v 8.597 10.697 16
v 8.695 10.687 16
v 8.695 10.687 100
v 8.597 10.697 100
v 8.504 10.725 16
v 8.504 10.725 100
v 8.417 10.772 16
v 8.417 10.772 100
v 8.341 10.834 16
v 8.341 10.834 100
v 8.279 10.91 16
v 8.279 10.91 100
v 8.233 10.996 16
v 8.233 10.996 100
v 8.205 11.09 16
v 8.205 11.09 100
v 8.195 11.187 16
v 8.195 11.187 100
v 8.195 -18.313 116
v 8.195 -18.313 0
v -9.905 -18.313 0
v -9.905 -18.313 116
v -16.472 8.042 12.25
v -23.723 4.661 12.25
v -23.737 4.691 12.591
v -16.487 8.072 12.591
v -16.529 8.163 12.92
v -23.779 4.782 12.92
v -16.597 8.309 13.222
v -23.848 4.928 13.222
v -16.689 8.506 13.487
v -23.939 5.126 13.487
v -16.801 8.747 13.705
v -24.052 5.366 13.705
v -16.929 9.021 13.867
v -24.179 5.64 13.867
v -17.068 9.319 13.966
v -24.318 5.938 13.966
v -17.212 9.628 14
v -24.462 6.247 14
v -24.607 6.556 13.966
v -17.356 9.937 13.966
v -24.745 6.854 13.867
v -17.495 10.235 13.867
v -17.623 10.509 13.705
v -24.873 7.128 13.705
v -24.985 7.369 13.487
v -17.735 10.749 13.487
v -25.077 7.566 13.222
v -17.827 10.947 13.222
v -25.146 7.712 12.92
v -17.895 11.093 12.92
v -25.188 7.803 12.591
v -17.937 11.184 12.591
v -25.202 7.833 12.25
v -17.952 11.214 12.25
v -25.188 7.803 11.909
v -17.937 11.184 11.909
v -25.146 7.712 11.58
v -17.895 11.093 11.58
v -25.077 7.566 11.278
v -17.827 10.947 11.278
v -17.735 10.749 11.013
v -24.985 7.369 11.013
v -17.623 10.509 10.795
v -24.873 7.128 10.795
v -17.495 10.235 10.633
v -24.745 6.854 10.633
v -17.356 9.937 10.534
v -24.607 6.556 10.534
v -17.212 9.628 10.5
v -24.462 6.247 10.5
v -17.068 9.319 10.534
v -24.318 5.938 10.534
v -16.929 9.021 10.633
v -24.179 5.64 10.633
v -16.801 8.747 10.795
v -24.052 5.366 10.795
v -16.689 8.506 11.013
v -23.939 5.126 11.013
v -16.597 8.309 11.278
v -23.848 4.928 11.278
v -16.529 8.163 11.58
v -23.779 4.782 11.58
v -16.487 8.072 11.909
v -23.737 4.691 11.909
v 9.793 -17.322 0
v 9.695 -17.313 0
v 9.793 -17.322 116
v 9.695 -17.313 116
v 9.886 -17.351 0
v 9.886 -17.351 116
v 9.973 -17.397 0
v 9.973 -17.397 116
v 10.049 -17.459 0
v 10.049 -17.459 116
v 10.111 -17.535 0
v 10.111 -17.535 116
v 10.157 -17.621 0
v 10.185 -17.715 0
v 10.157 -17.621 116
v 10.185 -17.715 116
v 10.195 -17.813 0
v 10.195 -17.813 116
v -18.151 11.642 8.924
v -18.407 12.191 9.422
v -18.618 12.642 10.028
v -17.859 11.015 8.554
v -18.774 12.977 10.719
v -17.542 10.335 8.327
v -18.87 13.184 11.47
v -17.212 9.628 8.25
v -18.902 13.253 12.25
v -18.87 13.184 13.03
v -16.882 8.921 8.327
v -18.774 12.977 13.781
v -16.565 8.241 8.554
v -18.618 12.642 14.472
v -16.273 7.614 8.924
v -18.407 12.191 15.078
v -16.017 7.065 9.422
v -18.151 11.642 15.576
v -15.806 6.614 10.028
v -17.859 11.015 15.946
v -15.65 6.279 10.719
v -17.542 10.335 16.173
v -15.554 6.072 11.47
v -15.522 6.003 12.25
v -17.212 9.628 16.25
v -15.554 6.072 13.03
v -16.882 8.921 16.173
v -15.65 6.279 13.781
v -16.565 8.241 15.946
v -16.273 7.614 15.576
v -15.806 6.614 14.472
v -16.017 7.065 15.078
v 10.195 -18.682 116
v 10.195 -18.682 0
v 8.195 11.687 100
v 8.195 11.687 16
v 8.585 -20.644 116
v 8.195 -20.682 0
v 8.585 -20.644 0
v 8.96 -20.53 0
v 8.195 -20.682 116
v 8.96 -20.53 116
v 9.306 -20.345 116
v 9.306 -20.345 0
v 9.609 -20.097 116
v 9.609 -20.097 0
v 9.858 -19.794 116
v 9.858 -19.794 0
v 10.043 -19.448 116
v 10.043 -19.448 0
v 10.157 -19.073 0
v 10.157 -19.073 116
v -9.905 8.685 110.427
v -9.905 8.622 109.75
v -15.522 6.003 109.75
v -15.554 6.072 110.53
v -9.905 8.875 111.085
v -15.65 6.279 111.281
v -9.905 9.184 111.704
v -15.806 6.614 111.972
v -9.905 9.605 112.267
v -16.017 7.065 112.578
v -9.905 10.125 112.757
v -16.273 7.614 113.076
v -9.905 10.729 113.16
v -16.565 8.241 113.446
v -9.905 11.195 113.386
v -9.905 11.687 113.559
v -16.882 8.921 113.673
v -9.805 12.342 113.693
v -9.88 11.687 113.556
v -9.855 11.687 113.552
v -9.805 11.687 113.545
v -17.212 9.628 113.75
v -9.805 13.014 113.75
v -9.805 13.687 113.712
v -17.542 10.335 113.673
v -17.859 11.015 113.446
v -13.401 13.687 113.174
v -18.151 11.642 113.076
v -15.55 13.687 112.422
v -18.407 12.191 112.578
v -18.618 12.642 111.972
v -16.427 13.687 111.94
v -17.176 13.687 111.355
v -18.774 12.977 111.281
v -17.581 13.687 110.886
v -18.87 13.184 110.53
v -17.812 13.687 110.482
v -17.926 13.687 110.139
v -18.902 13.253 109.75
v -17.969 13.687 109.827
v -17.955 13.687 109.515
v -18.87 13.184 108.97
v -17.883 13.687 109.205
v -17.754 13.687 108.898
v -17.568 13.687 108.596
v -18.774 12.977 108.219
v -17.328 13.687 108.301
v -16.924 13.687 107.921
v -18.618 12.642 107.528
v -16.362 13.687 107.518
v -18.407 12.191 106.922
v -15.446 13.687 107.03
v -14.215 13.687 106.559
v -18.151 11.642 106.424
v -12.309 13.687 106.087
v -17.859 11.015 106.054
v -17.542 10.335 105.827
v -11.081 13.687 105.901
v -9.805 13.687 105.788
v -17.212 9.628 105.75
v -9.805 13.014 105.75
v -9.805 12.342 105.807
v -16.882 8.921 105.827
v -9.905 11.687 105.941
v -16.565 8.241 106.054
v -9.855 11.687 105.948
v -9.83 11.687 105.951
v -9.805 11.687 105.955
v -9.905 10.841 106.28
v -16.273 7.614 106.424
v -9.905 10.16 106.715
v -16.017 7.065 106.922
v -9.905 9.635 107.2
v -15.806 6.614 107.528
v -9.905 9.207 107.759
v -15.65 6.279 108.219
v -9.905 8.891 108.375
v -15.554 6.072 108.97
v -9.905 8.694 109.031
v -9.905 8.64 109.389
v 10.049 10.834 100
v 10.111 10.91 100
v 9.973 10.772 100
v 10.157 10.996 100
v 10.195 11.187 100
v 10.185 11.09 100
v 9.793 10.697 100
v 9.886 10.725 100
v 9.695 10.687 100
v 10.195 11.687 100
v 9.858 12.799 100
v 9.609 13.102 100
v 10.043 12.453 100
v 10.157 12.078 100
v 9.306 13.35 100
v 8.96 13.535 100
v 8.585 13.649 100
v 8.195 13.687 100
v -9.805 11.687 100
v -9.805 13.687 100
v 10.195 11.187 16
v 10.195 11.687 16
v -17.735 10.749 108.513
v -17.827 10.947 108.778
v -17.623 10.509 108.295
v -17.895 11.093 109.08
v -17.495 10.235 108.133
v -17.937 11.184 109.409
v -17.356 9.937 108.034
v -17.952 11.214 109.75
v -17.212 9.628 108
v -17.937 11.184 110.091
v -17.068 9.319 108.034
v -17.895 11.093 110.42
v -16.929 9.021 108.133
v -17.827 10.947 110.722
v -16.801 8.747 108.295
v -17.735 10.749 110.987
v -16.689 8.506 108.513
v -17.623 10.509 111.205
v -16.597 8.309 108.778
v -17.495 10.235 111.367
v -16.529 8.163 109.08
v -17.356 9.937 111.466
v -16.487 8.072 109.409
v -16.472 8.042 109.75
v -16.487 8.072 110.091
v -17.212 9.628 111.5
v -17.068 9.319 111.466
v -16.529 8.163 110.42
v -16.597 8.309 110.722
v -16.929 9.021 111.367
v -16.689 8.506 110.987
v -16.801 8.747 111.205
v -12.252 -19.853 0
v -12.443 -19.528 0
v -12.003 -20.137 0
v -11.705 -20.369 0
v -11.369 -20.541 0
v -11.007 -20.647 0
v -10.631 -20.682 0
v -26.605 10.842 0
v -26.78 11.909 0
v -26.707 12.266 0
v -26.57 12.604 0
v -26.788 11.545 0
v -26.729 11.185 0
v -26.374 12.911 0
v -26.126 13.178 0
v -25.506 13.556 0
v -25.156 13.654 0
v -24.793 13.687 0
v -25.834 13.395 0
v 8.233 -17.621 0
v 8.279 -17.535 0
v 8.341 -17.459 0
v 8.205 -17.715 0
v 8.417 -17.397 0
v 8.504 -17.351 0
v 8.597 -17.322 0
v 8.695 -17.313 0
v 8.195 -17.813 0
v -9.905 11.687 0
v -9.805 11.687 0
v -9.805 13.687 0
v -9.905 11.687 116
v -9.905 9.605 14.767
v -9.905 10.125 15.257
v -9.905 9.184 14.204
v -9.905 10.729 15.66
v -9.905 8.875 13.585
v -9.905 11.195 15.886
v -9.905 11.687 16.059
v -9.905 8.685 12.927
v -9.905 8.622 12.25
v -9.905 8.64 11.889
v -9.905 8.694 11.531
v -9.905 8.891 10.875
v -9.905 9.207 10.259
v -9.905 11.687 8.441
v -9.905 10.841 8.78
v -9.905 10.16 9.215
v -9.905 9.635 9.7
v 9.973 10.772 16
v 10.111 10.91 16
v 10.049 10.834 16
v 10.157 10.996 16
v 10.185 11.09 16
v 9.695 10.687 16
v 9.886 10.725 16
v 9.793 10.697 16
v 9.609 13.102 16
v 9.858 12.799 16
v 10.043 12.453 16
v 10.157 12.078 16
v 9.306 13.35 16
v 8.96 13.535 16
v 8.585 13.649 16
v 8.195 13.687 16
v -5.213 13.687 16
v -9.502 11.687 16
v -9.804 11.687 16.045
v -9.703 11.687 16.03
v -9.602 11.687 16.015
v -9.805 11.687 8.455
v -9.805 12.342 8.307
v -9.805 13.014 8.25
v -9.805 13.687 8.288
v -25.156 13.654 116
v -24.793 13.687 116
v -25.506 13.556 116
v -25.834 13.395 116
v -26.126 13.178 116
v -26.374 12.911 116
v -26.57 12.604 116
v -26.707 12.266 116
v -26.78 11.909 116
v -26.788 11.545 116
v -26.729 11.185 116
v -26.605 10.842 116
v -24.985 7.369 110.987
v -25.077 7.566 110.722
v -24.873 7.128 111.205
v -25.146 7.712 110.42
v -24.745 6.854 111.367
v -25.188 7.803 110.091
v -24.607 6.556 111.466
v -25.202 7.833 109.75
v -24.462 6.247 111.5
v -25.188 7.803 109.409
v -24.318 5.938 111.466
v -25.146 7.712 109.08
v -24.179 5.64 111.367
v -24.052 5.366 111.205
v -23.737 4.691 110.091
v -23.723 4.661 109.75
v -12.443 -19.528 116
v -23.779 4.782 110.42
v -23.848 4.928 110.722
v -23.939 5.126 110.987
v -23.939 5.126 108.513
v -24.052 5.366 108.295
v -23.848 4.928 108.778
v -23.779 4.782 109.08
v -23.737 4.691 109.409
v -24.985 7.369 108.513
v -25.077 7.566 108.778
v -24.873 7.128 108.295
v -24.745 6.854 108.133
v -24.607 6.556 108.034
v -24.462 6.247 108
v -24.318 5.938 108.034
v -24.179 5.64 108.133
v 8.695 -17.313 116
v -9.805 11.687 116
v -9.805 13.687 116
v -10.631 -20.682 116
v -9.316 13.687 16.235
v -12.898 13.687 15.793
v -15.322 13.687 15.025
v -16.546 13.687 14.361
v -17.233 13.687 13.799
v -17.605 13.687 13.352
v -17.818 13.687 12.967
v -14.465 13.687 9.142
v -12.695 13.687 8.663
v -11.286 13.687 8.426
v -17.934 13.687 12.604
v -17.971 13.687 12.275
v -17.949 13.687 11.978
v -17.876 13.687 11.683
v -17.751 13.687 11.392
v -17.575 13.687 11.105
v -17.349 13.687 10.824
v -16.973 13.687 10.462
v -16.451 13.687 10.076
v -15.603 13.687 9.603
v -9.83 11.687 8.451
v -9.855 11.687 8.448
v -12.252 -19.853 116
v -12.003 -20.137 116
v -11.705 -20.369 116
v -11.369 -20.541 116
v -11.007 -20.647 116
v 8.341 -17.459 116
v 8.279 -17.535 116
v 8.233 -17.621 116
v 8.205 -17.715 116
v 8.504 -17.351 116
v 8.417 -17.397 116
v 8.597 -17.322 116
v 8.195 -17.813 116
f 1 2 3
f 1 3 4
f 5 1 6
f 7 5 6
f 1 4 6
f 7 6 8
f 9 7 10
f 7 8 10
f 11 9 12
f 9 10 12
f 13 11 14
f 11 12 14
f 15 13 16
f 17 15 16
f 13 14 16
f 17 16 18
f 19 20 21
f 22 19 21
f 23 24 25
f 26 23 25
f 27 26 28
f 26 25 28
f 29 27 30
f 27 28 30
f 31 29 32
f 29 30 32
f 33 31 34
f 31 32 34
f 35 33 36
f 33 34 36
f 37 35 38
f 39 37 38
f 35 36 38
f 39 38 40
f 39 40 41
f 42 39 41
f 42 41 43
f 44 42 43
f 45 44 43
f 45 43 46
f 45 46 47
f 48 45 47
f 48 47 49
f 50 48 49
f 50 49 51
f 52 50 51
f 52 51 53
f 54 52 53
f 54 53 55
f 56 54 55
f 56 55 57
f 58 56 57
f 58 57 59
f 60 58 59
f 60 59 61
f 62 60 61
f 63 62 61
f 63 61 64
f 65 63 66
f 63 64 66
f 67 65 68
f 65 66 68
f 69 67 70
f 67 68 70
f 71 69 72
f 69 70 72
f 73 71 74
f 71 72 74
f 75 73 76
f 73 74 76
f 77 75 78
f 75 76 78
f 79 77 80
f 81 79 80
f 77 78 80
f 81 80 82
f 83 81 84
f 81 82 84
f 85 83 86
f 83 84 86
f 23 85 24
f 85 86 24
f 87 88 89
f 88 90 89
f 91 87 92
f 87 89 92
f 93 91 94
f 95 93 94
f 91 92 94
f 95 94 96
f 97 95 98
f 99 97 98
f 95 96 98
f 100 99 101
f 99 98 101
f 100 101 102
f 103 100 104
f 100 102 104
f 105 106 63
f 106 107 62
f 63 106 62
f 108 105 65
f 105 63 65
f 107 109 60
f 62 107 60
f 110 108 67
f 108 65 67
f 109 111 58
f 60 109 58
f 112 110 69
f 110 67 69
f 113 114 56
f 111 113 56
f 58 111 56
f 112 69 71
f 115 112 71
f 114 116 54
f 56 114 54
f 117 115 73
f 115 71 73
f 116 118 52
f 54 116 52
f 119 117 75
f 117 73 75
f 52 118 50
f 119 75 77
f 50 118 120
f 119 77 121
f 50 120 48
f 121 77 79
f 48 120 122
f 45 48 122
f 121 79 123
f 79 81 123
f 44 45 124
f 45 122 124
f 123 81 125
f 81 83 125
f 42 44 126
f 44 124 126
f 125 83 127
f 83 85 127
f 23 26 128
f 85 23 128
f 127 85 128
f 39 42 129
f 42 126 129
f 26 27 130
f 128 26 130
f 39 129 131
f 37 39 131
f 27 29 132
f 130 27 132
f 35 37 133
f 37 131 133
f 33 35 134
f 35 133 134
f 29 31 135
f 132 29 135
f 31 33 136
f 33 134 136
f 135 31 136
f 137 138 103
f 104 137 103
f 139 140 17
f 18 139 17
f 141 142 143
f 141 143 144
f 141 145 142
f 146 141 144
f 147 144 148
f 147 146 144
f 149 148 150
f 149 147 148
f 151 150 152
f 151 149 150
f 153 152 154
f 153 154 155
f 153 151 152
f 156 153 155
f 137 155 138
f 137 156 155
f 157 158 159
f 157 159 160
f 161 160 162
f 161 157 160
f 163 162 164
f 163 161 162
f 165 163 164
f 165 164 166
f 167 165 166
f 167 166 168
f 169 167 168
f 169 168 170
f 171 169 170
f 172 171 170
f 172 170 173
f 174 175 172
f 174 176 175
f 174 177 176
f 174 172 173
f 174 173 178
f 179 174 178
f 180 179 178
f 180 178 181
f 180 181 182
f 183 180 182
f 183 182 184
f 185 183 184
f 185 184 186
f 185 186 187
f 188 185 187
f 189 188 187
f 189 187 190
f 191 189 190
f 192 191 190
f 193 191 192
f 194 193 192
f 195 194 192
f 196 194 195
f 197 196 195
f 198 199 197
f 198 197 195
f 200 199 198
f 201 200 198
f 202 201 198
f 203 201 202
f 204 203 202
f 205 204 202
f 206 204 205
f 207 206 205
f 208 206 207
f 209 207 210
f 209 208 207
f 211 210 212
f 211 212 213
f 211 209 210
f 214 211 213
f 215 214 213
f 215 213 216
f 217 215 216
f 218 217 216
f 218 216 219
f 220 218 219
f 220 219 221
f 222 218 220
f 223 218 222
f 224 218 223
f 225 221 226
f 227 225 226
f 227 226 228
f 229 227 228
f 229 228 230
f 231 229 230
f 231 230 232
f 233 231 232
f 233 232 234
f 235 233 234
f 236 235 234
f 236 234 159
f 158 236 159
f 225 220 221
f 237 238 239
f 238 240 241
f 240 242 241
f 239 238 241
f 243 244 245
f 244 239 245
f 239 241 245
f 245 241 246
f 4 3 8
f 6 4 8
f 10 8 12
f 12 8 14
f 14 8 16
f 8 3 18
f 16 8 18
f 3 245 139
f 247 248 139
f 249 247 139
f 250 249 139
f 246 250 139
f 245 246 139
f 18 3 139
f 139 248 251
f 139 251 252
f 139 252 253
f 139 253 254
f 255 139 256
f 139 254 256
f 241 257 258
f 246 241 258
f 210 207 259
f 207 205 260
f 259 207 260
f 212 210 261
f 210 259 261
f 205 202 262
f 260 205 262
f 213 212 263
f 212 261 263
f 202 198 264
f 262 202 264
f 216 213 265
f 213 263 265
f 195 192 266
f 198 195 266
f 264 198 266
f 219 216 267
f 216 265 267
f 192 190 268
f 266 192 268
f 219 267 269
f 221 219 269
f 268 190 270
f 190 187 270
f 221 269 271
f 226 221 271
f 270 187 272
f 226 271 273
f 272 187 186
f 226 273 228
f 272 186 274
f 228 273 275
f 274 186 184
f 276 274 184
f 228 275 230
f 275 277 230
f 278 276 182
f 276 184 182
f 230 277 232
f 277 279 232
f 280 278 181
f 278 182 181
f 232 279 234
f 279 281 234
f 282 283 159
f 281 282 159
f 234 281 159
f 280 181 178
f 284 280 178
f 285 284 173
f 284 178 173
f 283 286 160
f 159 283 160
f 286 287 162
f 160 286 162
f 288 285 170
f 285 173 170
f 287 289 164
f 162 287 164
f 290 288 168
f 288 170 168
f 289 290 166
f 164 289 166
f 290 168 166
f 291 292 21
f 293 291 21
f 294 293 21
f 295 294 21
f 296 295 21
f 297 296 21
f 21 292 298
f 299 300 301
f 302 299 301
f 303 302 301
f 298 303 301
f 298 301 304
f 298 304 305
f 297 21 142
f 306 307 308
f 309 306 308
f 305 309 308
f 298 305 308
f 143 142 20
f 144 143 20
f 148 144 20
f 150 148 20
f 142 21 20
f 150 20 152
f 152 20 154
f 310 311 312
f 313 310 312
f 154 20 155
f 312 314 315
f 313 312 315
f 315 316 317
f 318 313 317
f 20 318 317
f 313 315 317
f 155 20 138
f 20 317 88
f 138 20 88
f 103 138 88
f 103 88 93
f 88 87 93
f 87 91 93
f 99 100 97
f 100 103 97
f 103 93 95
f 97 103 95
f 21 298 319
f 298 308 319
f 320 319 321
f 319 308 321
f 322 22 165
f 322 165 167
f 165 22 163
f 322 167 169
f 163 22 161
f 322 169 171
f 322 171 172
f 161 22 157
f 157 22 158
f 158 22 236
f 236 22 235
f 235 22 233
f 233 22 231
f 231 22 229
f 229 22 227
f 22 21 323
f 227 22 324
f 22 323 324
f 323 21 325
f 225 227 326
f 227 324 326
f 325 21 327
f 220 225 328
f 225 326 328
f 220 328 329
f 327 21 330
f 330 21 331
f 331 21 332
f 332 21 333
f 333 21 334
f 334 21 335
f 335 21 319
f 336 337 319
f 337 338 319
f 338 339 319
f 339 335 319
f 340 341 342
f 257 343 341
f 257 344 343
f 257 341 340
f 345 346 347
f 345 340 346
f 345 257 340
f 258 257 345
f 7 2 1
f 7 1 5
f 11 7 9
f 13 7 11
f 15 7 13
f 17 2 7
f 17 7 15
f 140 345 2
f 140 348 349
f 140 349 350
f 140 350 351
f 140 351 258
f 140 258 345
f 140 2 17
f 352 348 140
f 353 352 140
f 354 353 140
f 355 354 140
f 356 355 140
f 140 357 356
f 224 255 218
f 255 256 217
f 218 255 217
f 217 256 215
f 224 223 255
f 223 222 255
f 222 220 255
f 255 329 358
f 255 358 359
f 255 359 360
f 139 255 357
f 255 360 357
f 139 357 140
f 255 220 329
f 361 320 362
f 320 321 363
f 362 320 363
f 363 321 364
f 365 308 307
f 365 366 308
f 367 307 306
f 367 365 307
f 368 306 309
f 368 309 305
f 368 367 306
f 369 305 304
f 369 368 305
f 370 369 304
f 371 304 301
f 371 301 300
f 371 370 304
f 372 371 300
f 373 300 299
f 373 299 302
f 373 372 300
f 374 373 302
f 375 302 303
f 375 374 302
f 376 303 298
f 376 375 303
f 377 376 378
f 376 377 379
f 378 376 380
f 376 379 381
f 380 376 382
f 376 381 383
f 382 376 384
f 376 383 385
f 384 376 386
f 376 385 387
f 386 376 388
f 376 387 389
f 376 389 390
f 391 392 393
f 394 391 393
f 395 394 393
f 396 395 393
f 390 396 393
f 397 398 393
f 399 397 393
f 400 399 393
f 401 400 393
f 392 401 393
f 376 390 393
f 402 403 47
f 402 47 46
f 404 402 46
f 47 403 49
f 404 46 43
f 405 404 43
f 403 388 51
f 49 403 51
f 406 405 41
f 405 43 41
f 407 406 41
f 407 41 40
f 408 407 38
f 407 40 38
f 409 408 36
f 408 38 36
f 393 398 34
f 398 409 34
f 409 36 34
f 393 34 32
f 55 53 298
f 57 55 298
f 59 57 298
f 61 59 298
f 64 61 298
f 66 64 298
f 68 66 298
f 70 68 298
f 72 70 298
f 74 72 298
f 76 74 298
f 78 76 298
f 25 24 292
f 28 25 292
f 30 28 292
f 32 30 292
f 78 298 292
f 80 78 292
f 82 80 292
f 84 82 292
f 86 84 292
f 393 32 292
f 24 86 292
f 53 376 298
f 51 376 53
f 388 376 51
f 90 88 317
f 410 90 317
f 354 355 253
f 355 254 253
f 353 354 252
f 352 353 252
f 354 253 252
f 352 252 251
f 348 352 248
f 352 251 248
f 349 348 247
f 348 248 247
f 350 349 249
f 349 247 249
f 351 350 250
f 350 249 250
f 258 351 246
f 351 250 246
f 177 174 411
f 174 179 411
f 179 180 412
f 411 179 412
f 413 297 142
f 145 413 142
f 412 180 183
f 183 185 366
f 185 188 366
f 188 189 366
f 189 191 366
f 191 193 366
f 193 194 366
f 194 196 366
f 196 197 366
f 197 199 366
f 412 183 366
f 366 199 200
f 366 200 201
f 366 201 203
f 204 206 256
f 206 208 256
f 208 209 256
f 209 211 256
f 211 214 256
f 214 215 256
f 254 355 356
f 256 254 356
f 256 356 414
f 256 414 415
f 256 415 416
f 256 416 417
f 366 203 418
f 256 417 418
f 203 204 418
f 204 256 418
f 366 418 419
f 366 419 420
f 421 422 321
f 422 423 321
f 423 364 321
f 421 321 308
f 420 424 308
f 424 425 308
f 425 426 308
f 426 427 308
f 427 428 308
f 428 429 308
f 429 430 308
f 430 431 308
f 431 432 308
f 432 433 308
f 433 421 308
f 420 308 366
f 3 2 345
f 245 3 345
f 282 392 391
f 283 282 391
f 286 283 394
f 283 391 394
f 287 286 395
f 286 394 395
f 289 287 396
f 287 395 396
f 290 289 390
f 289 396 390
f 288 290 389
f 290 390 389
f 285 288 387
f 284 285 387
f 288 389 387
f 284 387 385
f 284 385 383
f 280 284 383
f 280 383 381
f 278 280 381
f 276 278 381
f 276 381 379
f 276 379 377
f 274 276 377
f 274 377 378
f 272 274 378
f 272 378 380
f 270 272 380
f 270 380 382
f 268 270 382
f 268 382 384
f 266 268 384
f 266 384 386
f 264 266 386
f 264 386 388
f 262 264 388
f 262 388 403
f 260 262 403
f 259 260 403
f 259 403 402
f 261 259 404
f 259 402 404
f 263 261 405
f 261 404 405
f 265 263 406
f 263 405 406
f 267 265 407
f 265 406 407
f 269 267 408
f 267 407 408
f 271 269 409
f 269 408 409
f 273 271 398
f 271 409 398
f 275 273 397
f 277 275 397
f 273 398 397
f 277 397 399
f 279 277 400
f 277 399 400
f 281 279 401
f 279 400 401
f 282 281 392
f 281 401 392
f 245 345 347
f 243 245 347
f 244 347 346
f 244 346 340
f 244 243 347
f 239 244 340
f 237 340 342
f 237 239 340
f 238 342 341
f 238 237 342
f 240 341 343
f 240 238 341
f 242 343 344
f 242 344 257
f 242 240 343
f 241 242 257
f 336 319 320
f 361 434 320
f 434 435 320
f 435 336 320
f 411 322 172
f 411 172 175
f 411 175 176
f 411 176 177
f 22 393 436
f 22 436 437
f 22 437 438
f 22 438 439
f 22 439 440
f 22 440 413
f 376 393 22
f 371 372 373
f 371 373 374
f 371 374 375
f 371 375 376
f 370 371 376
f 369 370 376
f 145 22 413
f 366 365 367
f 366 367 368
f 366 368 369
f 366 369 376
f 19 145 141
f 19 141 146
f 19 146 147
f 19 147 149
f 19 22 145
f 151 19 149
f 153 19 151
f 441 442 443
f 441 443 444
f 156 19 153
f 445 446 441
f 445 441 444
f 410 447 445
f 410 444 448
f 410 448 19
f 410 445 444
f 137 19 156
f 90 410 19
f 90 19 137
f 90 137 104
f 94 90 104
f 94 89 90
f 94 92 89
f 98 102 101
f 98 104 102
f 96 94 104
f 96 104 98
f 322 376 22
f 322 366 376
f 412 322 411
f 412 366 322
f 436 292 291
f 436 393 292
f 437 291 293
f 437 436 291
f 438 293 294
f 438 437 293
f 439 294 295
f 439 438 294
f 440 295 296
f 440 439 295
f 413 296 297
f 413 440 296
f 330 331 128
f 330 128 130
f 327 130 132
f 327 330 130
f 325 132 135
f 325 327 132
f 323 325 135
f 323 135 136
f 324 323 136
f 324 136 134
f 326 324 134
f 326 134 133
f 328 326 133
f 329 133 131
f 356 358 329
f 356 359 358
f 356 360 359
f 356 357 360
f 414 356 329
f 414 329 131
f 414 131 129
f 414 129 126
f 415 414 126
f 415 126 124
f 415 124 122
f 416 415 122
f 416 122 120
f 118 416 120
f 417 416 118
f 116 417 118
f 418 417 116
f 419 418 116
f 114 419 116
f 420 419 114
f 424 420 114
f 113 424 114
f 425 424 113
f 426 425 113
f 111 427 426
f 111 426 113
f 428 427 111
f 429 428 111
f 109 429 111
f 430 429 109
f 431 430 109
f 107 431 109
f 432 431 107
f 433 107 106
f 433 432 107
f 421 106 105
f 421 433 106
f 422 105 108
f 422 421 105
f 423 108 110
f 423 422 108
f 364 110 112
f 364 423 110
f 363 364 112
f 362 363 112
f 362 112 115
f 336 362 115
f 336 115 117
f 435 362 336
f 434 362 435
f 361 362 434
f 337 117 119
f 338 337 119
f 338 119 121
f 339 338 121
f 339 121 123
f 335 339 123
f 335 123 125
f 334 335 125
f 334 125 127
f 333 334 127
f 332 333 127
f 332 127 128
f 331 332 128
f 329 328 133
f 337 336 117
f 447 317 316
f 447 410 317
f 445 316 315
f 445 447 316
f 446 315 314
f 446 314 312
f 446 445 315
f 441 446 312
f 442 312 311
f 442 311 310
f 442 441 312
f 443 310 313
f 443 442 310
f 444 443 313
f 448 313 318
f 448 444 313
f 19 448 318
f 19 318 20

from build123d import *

# Parameters (mm, degrees)
PAD_DEPTH       = 116
SKETCH001_R     = 1.75
POCKET_DEPTH    = 17.6055143834
SKETCH002_R     = 4
POCKET001_DEPTH = 14
SKETCH003_W     = 20
SKETCH003_H     = 16
POCKET002_DEPTH = 5
FILLET_R        = 2
FILLET001_R     = 2
FILLET002_R     = 0.5
FILLET003_R     = 0.5


with BuildPart() as part:
    # Sketch (on XY_Plane of Origin) → Pad (new body)
    with BuildSketch(Plane.XY):
        Polygon((10.1949841474, 13.6874291489), (-11.9050158526, 13.6874291489), (-27.9319746193, 13.6874291489), (-11.9050158526, -20.6824948412), (10.1949841474, -20.6824948412), (10.1949841474, -18.6824948412), (10.1949841474, -17.3125708511), (8.1949841474, -17.3125708511), (8.1949841474, -18.3125708511), (-9.9050158526, -18.3125708511), (-9.9050158526, 11.6874291489), (8.1949841474, 11.6874291489), (8.1949841474, 10.6874291489), (10.1949841474, 10.6874291489), align=None)
    extrude(amount=PAD_DEPTH)

    # Sketch001 (on Face10 of Pad) → Pocket (cut)
    with BuildSketch(Plane(origin=(-17.7005613893, -8.2539073295, 0), x_dir=(0.4226182617, -0.906307787, 0), z_dir=(-0.906307787, -0.4226182617, 0))):
        with Locations((-16, 109.75)):
            Circle(SKETCH001_R)
        with Locations((-16, 12.25)):
            Circle(SKETCH001_R)
    extrude(amount=-POCKET_DEPTH, mode=Mode.SUBTRACT)

    # Sketch002 (on Face12 of Pocket) → Pocket001 (cut)
    with BuildSketch(Plane(origin=(2.2382099255, 1.0436944288, 0), x_dir=(0.4226182617, -0.906307787, 0), z_dir=(-0.906307787, -0.4226182617, 0))):
        with Locations((-16, 109.75)):
            Circle(SKETCH002_R)
        with Locations((-16, 12.25)):
            Circle(SKETCH002_R)
    extrude(amount=POCKET001_DEPTH, mode=Mode.SUBTRACT)

    # Sketch003 (on Face11 of Pocket001) → Pocket002 (cut)
    with BuildSketch(Plane(origin=(0, 13.6874291489, 0), x_dir=(-1, 0, 0), z_dir=(0, 1, 0))):
        with Locations((-0.1949841474, 8)):
            Rectangle(SKETCH003_W, SKETCH003_H)
        with Locations((-0.1949841474, 108)):
            Rectangle(SKETCH003_W, SKETCH003_H)
    extrude(amount=-POCKET002_DEPTH, mode=Mode.SUBTRACT)

    # Fillet
    fillet_edges = [part.edges().sort_by_distance(p)[0] for p in [
        (-27.931975, 13.687429, 58),
        (-11.905016, -20.682495, 58),
    ]]
    fillet(fillet_edges, radius=FILLET_R)

    # Fillet001
    fillet001_edges = [part.edges().sort_by_distance(p)[0] for p in [
        (10.194984, -20.682495, 58),
        (10.194984, 13.687429, 58),
    ]]
    fillet(fillet001_edges, radius=FILLET001_R)

    # Fillet002
    fillet002_edges = [part.edges().sort_by_distance(p)[0] for p in [
        (8.194984, 10.687429, 58),
        (8.194984, -17.312571, 58),
    ]]
    fillet(fillet002_edges, radius=FILLET002_R)

    # Fillet003
    fillet003_edges = [part.edges().sort_by_distance(p)[0] for p in [
        (10.194984, 10.687429, 58),
        (10.194984, -17.312571, 58),
    ]]
    fillet(fillet003_edges, radius=FILLET003_R)


solid = part.part
